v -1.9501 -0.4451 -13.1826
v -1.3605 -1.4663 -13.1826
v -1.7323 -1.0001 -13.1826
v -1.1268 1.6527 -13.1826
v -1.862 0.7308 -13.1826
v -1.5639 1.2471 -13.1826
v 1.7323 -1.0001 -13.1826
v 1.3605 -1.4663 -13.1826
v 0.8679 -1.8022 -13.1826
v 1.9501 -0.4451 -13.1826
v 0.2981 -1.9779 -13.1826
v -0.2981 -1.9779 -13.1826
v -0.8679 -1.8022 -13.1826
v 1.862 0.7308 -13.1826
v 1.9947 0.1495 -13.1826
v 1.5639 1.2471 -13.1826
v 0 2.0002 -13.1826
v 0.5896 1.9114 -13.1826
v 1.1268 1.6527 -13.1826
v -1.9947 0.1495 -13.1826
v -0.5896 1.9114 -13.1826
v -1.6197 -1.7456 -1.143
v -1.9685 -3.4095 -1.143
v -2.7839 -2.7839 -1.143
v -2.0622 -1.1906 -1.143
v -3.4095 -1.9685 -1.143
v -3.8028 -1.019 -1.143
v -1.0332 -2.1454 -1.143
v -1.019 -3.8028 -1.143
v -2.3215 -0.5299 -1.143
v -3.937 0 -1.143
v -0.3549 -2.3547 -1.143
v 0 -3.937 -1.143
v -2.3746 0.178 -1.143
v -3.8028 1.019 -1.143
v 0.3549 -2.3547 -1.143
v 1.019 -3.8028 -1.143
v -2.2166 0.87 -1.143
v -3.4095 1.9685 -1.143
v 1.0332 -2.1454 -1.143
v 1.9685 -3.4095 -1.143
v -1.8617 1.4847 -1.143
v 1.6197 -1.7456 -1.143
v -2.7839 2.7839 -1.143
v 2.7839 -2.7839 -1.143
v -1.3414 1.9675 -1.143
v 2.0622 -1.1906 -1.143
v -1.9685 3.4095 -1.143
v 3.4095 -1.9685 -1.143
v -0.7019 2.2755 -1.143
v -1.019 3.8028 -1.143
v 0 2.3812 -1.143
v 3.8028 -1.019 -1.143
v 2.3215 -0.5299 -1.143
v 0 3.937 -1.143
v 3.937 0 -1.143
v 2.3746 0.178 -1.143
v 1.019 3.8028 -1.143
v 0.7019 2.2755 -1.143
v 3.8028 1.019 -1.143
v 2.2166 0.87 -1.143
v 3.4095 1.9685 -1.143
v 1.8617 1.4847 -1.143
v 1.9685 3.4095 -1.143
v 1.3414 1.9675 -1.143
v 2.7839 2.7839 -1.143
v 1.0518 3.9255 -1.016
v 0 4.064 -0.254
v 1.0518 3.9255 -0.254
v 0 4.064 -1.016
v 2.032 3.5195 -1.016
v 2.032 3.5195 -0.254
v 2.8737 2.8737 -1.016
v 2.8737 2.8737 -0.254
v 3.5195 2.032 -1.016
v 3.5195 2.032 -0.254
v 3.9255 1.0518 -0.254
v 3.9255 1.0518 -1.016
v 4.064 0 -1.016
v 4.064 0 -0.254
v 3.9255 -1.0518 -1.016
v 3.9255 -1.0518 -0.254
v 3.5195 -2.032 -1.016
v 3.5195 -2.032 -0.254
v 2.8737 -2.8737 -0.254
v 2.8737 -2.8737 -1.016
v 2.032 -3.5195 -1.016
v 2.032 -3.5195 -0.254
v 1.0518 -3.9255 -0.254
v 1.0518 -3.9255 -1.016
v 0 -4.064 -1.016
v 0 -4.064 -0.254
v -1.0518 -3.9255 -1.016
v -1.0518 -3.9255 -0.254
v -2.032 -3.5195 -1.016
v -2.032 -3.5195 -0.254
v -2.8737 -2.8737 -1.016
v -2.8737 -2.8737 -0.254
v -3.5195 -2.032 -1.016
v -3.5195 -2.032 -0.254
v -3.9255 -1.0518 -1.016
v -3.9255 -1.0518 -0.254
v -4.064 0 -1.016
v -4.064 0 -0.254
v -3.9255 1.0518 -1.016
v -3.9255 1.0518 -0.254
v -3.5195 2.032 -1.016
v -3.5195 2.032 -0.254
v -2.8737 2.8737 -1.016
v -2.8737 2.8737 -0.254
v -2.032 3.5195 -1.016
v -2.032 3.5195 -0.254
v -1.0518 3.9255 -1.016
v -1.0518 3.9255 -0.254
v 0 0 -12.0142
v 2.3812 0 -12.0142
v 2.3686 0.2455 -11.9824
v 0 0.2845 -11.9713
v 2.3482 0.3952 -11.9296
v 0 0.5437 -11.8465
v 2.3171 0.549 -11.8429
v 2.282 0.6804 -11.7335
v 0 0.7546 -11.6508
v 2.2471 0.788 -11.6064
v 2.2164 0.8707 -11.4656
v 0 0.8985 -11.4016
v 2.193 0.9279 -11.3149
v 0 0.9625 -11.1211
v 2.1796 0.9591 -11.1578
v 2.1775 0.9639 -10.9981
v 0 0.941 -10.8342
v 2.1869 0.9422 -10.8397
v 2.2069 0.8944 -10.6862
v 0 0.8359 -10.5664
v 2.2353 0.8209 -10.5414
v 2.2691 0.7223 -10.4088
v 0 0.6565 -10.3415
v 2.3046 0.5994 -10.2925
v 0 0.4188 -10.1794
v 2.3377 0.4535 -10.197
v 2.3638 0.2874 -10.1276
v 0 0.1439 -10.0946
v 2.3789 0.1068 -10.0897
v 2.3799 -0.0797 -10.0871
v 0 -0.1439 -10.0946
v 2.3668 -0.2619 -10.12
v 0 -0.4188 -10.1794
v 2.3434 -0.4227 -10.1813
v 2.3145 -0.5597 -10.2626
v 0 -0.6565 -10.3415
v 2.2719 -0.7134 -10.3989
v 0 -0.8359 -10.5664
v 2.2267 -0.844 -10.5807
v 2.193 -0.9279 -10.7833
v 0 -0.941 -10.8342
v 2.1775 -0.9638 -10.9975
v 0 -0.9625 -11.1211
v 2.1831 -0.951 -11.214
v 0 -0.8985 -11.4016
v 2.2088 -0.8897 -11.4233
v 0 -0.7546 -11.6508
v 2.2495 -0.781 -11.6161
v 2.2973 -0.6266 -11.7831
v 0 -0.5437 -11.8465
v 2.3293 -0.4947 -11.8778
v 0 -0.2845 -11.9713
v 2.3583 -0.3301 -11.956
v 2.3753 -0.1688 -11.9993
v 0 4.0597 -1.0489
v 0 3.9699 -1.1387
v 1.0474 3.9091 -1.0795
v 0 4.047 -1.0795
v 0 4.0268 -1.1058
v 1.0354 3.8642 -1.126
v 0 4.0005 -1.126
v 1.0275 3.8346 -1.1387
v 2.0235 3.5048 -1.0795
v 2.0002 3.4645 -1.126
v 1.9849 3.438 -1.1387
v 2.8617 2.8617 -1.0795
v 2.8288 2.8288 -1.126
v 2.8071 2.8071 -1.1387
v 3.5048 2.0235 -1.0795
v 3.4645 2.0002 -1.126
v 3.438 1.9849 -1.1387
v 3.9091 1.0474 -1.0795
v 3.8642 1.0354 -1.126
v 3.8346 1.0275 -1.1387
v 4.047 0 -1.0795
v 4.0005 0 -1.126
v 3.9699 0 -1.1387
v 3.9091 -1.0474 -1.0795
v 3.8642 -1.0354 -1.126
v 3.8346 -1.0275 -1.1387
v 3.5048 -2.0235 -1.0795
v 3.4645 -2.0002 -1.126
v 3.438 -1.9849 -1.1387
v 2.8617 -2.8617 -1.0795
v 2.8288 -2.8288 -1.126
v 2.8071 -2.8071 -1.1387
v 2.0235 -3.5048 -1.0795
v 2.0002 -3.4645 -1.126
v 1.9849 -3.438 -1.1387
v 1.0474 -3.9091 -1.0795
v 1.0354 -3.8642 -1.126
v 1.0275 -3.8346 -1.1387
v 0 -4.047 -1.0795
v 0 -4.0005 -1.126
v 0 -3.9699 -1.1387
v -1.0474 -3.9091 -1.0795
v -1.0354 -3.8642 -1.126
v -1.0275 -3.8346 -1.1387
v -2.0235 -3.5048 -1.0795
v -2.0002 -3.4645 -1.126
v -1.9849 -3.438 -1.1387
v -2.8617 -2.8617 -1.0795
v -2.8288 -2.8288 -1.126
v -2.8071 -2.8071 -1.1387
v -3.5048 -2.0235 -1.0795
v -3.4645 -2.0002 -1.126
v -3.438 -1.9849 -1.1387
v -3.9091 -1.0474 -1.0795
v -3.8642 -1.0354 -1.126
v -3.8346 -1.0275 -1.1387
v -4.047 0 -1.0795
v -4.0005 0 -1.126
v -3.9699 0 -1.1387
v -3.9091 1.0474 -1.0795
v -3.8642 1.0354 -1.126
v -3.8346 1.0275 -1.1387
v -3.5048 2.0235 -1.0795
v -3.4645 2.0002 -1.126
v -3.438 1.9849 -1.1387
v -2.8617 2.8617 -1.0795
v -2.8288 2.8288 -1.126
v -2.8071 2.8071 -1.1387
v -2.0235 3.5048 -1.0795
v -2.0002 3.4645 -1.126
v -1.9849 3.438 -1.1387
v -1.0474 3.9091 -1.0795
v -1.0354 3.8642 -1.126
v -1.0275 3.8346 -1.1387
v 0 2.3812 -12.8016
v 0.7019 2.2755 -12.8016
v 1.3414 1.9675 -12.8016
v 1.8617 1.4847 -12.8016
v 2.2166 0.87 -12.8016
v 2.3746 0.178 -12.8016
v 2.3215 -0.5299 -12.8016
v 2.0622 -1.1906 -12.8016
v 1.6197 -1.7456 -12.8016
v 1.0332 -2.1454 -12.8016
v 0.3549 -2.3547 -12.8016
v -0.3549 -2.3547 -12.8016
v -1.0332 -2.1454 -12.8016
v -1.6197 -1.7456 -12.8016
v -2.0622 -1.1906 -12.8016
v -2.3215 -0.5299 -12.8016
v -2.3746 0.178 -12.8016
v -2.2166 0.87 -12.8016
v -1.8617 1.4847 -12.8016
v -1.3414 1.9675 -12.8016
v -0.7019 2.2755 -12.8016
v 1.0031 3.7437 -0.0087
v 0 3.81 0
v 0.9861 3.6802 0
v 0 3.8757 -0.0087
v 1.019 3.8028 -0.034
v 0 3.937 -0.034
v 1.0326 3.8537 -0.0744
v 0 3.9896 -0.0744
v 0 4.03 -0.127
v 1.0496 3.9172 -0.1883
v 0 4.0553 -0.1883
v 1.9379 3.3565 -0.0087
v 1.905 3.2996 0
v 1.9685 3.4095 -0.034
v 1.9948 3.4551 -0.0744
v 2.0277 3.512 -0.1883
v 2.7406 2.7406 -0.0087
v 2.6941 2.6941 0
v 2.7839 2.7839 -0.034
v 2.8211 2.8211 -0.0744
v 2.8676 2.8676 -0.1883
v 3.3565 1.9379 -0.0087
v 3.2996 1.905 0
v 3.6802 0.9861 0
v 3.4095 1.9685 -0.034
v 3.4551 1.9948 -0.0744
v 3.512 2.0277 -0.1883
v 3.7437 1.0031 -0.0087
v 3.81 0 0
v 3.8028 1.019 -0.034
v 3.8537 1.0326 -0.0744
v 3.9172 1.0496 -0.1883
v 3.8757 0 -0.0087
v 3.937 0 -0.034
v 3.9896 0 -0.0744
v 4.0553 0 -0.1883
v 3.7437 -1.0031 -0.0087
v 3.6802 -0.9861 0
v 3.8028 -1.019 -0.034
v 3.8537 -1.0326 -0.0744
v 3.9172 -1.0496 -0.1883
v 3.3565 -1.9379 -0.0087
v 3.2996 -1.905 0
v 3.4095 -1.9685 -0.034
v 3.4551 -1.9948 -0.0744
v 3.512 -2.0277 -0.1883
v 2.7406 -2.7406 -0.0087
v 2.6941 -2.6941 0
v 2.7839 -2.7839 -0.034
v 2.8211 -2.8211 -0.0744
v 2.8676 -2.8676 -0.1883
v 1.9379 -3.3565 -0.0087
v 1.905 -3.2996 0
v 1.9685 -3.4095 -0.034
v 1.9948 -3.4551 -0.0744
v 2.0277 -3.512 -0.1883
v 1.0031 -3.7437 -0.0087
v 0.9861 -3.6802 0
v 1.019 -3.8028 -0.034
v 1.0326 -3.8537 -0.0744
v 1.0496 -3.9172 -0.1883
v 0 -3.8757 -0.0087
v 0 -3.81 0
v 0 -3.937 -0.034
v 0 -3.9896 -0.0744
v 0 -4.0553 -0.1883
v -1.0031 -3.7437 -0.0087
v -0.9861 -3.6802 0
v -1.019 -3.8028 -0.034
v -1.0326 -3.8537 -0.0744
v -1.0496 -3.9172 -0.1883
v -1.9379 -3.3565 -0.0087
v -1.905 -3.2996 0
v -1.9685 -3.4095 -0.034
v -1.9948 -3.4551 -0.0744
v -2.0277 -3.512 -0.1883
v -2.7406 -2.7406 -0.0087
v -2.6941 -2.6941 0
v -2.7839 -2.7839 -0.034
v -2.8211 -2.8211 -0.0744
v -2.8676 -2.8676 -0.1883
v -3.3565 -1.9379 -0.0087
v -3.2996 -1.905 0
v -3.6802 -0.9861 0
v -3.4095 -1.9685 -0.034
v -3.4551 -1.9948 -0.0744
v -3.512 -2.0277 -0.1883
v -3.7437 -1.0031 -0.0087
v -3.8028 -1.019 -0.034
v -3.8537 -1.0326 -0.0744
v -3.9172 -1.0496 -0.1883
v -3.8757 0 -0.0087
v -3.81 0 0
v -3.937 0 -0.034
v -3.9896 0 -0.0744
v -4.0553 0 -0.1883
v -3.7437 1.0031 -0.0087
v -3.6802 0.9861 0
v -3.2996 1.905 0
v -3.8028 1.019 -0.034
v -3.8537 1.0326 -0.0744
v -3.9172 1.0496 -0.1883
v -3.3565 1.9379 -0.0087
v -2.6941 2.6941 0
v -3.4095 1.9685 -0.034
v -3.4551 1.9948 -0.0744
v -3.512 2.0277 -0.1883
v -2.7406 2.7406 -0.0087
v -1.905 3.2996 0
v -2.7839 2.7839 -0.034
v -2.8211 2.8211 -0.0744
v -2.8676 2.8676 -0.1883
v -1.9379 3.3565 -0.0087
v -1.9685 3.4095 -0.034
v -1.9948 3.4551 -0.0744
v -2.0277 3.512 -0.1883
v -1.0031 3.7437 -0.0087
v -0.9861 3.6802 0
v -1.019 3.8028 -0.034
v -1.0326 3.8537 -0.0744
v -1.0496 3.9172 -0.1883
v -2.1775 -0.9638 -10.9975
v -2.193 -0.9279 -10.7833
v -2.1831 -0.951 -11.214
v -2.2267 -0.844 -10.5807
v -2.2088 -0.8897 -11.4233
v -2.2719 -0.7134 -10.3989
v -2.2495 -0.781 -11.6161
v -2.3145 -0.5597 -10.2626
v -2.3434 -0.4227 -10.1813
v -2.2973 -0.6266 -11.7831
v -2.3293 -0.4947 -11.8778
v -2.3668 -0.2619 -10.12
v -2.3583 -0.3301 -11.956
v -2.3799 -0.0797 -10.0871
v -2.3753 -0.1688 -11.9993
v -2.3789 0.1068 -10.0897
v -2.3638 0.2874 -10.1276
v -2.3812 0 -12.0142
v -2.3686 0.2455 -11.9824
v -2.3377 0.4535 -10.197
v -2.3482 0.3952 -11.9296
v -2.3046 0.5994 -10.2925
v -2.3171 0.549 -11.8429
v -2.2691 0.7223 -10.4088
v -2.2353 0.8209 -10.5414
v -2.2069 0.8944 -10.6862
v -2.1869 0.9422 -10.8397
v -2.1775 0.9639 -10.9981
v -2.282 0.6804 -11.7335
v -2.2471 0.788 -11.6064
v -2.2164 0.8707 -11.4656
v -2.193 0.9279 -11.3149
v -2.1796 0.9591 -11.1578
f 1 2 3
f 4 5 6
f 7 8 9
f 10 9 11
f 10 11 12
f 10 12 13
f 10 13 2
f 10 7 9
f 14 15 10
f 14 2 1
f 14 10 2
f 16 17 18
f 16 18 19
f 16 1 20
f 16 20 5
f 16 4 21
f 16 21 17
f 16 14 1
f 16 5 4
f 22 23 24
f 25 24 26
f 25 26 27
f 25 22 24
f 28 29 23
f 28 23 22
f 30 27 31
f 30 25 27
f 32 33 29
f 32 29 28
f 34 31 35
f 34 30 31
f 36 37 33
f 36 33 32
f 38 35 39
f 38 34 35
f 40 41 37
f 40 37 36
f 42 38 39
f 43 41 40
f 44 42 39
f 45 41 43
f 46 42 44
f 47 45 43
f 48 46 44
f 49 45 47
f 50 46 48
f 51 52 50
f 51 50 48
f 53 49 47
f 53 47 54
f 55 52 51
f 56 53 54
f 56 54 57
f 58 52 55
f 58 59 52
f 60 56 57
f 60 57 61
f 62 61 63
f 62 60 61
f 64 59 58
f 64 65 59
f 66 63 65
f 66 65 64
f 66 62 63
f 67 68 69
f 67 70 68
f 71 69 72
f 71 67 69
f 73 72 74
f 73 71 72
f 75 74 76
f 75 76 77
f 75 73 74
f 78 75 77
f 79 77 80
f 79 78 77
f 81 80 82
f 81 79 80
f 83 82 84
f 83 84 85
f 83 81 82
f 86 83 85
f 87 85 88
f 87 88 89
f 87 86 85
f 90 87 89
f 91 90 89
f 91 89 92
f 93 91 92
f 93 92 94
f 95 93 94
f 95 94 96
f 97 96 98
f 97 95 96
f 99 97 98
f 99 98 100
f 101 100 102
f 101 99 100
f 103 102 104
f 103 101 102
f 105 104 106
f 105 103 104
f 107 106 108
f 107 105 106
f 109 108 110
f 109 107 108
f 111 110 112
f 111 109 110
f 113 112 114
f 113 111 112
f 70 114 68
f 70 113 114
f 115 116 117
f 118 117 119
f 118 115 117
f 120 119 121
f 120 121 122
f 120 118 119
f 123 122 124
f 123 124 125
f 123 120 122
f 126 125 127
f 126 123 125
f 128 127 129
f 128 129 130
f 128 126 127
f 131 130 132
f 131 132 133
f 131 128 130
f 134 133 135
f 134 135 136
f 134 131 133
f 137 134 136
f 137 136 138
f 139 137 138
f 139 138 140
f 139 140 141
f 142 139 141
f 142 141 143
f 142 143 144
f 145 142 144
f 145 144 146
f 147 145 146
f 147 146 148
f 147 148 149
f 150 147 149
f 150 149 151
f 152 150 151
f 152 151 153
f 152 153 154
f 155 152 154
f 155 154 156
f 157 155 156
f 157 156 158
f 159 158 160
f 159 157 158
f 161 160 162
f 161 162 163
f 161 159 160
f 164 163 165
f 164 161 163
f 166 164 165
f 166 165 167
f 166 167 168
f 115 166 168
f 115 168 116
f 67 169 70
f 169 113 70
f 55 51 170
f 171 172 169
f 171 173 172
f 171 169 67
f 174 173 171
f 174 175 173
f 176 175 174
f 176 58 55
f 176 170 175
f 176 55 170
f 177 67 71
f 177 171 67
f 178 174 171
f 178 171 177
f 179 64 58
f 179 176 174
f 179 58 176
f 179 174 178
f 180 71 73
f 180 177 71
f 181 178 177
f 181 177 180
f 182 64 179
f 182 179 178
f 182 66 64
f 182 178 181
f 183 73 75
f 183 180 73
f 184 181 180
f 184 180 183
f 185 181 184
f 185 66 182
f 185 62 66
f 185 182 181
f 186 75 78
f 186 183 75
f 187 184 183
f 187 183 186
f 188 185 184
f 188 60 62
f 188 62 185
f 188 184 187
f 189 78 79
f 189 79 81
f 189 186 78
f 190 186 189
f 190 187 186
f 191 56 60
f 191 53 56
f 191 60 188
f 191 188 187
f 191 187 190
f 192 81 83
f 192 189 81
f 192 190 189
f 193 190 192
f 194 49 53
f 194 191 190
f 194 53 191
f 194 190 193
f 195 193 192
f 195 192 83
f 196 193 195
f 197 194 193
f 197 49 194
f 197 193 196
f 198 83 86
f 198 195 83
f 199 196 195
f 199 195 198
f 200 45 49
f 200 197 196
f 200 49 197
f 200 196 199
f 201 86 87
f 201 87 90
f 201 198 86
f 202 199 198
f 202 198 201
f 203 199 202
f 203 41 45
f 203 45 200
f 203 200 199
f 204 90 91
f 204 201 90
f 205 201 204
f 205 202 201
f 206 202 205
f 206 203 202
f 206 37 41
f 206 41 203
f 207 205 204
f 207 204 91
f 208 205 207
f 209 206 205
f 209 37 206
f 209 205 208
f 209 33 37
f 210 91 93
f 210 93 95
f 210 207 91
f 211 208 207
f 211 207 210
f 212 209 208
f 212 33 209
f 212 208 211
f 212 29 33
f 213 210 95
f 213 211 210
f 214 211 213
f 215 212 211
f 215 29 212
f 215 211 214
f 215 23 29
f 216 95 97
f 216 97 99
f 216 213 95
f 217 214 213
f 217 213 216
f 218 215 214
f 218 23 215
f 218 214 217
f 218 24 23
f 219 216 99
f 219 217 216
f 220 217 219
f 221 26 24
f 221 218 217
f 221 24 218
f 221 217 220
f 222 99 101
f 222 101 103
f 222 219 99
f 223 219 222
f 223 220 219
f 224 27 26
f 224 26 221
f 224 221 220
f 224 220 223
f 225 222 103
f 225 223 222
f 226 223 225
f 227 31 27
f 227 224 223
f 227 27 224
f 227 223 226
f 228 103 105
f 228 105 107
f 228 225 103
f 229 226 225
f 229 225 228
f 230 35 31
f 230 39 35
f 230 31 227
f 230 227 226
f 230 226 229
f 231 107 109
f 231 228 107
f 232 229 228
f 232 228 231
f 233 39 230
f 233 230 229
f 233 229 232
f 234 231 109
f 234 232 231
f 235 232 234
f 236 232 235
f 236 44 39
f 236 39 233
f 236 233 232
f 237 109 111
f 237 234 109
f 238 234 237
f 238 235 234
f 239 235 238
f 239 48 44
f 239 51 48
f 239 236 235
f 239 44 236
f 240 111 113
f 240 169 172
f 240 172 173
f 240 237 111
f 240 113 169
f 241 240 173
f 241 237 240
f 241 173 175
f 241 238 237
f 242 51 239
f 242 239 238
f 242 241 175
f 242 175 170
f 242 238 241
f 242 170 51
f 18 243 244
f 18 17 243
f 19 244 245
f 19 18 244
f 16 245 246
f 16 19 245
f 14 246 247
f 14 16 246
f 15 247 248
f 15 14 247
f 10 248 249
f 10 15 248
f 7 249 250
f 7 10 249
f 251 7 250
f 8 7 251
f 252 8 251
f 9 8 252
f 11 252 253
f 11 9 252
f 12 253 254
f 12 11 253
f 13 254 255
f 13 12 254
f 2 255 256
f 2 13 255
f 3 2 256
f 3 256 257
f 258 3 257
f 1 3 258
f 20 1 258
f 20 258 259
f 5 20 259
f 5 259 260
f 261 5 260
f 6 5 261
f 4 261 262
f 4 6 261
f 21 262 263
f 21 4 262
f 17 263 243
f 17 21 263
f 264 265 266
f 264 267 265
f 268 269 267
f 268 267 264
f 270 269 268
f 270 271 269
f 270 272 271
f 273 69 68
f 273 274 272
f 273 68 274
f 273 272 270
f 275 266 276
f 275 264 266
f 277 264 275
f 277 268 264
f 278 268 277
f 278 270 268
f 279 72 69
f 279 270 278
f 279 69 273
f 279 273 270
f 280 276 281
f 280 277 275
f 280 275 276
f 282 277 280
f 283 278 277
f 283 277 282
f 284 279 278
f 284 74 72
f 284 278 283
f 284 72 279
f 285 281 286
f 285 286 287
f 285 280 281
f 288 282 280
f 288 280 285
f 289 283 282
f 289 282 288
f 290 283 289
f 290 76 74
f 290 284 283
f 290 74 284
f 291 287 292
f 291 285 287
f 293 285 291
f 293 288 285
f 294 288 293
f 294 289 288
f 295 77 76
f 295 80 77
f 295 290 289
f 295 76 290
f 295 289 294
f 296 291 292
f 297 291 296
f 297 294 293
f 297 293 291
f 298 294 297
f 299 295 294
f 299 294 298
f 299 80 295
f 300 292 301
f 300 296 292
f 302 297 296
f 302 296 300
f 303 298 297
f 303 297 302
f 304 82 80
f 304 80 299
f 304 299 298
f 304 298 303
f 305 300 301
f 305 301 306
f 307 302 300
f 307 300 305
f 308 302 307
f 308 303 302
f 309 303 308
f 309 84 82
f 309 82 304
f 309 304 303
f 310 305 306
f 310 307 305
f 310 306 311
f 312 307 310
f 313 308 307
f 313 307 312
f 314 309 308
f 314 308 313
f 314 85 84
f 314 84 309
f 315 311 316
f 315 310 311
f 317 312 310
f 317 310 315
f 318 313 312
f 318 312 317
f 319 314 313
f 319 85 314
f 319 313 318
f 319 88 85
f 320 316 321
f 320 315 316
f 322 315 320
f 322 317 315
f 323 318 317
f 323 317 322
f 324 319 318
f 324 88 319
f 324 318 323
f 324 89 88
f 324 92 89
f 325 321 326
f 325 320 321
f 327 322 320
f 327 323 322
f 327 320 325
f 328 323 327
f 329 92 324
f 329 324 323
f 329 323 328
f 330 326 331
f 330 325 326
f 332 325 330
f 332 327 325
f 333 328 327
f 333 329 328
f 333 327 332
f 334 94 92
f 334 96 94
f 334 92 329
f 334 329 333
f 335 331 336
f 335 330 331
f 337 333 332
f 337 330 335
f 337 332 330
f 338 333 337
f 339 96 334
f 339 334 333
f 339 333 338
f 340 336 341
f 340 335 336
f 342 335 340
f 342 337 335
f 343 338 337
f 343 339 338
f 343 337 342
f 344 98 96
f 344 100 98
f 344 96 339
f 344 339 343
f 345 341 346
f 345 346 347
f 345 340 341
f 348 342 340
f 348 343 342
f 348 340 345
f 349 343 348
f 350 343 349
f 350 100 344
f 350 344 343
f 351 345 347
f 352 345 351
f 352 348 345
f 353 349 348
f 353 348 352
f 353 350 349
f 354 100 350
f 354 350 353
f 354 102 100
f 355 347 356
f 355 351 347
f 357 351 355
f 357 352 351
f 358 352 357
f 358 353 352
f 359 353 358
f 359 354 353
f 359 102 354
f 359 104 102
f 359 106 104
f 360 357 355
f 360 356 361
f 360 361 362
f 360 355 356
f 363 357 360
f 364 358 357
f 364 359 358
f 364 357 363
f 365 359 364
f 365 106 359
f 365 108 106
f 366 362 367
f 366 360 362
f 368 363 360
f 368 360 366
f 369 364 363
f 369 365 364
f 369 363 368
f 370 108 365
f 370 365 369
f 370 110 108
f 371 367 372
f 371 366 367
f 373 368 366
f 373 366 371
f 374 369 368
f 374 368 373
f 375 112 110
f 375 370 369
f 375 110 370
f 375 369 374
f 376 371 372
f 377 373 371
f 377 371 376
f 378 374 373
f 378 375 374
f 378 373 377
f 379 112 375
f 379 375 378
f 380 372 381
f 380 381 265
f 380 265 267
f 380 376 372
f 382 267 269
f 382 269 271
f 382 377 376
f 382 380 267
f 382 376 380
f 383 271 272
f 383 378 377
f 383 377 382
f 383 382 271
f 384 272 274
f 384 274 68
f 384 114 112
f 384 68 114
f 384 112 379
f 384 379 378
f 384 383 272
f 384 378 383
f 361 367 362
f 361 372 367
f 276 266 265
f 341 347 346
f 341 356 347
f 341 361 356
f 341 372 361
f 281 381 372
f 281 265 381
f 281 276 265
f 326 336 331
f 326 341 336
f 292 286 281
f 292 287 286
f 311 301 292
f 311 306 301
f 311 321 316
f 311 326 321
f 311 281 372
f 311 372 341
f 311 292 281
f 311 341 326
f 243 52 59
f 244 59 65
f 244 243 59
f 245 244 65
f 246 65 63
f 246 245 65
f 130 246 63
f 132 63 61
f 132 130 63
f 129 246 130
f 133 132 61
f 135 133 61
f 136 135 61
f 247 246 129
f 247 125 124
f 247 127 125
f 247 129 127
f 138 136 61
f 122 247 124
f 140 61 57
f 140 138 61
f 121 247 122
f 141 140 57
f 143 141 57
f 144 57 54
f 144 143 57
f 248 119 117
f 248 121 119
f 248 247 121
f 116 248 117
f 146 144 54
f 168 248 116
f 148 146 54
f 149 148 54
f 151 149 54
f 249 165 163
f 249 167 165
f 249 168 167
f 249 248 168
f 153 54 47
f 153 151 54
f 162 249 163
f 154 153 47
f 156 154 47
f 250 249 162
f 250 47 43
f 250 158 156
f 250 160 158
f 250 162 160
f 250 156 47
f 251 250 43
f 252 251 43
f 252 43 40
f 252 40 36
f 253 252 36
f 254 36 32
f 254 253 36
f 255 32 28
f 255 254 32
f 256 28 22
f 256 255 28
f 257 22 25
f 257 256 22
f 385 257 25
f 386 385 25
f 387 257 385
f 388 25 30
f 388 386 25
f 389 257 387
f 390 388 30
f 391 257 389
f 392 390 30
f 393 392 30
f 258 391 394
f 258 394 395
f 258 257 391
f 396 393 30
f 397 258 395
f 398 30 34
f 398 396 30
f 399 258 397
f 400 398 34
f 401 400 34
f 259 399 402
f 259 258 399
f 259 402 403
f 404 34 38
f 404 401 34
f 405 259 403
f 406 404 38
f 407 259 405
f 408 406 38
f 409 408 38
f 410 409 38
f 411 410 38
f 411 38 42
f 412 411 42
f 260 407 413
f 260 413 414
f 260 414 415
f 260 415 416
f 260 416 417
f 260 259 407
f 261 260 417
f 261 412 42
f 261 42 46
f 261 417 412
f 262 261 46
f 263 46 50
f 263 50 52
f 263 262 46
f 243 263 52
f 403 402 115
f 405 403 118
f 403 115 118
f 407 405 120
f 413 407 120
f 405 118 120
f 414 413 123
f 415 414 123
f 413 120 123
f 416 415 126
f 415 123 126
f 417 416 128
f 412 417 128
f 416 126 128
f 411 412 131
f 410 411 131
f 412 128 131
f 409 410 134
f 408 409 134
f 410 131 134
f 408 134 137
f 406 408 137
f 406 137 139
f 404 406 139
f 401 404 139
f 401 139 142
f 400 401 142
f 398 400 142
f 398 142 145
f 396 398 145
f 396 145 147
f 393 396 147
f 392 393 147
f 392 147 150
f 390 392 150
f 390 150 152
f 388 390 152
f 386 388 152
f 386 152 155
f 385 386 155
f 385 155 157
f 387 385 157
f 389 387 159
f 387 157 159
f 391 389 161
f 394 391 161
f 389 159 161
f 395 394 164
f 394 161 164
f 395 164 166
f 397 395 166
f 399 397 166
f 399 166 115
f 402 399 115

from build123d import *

# Parameters (mm, degrees)
SKETCH2_R           = 0.9652
EXTRUDE1_DEPTH      = 5.0640001
EXTRUDE1_DEPTH_BACK = 5.0640001


with BuildPart() as part:
    # Sketch1 → Revolve Base (revolve)
    with BuildSketch(Plane(origin=(0, 0, 0), x_dir=(0, 0, -1), z_dir=(1, 0, 0))):
        with BuildLine():
            Line((0, 0), (0, 3.81))
            ThreePointArc((0, 3.81), (0.074394878, 3.989605122), (0.254, 4.064))
            Line((0.254, 4.064), (1.016, 4.064))
            ThreePointArc((1.016, 4.064), (1.105802561, 4.026802561), (1.143, 3.937))
            Line((1.143, 3.937), (1.143, 2.38125))
            Line((1.143, 2.38125), (12.8016, 2.38125))
            Line((12.8016, 2.38125), (13.1826, 2.00025))
            Line((13.1826, 2.00025), (13.1826, 0))
            Line((13.1826, 0), (0, 0))
        make_face()
    revolve(axis=Axis((0, 0, 0), (0, 0, -1)))

    # Sketch2 → Extrude1 (cut, two sides)
    with BuildSketch(Plane(origin=(0, 0, 0), x_dir=(0, 0, -1), z_dir=(1, 0, 0))) as extrude1_sk:
        with Locations((11.049, 0)):
            Circle(SKETCH2_R)
    extrude(amount=EXTRUDE1_DEPTH, mode=Mode.SUBTRACT)
    extrude(extrude1_sk.sketch, amount=-EXTRUDE1_DEPTH_BACK, mode=Mode.SUBTRACT)


solid = part.part
